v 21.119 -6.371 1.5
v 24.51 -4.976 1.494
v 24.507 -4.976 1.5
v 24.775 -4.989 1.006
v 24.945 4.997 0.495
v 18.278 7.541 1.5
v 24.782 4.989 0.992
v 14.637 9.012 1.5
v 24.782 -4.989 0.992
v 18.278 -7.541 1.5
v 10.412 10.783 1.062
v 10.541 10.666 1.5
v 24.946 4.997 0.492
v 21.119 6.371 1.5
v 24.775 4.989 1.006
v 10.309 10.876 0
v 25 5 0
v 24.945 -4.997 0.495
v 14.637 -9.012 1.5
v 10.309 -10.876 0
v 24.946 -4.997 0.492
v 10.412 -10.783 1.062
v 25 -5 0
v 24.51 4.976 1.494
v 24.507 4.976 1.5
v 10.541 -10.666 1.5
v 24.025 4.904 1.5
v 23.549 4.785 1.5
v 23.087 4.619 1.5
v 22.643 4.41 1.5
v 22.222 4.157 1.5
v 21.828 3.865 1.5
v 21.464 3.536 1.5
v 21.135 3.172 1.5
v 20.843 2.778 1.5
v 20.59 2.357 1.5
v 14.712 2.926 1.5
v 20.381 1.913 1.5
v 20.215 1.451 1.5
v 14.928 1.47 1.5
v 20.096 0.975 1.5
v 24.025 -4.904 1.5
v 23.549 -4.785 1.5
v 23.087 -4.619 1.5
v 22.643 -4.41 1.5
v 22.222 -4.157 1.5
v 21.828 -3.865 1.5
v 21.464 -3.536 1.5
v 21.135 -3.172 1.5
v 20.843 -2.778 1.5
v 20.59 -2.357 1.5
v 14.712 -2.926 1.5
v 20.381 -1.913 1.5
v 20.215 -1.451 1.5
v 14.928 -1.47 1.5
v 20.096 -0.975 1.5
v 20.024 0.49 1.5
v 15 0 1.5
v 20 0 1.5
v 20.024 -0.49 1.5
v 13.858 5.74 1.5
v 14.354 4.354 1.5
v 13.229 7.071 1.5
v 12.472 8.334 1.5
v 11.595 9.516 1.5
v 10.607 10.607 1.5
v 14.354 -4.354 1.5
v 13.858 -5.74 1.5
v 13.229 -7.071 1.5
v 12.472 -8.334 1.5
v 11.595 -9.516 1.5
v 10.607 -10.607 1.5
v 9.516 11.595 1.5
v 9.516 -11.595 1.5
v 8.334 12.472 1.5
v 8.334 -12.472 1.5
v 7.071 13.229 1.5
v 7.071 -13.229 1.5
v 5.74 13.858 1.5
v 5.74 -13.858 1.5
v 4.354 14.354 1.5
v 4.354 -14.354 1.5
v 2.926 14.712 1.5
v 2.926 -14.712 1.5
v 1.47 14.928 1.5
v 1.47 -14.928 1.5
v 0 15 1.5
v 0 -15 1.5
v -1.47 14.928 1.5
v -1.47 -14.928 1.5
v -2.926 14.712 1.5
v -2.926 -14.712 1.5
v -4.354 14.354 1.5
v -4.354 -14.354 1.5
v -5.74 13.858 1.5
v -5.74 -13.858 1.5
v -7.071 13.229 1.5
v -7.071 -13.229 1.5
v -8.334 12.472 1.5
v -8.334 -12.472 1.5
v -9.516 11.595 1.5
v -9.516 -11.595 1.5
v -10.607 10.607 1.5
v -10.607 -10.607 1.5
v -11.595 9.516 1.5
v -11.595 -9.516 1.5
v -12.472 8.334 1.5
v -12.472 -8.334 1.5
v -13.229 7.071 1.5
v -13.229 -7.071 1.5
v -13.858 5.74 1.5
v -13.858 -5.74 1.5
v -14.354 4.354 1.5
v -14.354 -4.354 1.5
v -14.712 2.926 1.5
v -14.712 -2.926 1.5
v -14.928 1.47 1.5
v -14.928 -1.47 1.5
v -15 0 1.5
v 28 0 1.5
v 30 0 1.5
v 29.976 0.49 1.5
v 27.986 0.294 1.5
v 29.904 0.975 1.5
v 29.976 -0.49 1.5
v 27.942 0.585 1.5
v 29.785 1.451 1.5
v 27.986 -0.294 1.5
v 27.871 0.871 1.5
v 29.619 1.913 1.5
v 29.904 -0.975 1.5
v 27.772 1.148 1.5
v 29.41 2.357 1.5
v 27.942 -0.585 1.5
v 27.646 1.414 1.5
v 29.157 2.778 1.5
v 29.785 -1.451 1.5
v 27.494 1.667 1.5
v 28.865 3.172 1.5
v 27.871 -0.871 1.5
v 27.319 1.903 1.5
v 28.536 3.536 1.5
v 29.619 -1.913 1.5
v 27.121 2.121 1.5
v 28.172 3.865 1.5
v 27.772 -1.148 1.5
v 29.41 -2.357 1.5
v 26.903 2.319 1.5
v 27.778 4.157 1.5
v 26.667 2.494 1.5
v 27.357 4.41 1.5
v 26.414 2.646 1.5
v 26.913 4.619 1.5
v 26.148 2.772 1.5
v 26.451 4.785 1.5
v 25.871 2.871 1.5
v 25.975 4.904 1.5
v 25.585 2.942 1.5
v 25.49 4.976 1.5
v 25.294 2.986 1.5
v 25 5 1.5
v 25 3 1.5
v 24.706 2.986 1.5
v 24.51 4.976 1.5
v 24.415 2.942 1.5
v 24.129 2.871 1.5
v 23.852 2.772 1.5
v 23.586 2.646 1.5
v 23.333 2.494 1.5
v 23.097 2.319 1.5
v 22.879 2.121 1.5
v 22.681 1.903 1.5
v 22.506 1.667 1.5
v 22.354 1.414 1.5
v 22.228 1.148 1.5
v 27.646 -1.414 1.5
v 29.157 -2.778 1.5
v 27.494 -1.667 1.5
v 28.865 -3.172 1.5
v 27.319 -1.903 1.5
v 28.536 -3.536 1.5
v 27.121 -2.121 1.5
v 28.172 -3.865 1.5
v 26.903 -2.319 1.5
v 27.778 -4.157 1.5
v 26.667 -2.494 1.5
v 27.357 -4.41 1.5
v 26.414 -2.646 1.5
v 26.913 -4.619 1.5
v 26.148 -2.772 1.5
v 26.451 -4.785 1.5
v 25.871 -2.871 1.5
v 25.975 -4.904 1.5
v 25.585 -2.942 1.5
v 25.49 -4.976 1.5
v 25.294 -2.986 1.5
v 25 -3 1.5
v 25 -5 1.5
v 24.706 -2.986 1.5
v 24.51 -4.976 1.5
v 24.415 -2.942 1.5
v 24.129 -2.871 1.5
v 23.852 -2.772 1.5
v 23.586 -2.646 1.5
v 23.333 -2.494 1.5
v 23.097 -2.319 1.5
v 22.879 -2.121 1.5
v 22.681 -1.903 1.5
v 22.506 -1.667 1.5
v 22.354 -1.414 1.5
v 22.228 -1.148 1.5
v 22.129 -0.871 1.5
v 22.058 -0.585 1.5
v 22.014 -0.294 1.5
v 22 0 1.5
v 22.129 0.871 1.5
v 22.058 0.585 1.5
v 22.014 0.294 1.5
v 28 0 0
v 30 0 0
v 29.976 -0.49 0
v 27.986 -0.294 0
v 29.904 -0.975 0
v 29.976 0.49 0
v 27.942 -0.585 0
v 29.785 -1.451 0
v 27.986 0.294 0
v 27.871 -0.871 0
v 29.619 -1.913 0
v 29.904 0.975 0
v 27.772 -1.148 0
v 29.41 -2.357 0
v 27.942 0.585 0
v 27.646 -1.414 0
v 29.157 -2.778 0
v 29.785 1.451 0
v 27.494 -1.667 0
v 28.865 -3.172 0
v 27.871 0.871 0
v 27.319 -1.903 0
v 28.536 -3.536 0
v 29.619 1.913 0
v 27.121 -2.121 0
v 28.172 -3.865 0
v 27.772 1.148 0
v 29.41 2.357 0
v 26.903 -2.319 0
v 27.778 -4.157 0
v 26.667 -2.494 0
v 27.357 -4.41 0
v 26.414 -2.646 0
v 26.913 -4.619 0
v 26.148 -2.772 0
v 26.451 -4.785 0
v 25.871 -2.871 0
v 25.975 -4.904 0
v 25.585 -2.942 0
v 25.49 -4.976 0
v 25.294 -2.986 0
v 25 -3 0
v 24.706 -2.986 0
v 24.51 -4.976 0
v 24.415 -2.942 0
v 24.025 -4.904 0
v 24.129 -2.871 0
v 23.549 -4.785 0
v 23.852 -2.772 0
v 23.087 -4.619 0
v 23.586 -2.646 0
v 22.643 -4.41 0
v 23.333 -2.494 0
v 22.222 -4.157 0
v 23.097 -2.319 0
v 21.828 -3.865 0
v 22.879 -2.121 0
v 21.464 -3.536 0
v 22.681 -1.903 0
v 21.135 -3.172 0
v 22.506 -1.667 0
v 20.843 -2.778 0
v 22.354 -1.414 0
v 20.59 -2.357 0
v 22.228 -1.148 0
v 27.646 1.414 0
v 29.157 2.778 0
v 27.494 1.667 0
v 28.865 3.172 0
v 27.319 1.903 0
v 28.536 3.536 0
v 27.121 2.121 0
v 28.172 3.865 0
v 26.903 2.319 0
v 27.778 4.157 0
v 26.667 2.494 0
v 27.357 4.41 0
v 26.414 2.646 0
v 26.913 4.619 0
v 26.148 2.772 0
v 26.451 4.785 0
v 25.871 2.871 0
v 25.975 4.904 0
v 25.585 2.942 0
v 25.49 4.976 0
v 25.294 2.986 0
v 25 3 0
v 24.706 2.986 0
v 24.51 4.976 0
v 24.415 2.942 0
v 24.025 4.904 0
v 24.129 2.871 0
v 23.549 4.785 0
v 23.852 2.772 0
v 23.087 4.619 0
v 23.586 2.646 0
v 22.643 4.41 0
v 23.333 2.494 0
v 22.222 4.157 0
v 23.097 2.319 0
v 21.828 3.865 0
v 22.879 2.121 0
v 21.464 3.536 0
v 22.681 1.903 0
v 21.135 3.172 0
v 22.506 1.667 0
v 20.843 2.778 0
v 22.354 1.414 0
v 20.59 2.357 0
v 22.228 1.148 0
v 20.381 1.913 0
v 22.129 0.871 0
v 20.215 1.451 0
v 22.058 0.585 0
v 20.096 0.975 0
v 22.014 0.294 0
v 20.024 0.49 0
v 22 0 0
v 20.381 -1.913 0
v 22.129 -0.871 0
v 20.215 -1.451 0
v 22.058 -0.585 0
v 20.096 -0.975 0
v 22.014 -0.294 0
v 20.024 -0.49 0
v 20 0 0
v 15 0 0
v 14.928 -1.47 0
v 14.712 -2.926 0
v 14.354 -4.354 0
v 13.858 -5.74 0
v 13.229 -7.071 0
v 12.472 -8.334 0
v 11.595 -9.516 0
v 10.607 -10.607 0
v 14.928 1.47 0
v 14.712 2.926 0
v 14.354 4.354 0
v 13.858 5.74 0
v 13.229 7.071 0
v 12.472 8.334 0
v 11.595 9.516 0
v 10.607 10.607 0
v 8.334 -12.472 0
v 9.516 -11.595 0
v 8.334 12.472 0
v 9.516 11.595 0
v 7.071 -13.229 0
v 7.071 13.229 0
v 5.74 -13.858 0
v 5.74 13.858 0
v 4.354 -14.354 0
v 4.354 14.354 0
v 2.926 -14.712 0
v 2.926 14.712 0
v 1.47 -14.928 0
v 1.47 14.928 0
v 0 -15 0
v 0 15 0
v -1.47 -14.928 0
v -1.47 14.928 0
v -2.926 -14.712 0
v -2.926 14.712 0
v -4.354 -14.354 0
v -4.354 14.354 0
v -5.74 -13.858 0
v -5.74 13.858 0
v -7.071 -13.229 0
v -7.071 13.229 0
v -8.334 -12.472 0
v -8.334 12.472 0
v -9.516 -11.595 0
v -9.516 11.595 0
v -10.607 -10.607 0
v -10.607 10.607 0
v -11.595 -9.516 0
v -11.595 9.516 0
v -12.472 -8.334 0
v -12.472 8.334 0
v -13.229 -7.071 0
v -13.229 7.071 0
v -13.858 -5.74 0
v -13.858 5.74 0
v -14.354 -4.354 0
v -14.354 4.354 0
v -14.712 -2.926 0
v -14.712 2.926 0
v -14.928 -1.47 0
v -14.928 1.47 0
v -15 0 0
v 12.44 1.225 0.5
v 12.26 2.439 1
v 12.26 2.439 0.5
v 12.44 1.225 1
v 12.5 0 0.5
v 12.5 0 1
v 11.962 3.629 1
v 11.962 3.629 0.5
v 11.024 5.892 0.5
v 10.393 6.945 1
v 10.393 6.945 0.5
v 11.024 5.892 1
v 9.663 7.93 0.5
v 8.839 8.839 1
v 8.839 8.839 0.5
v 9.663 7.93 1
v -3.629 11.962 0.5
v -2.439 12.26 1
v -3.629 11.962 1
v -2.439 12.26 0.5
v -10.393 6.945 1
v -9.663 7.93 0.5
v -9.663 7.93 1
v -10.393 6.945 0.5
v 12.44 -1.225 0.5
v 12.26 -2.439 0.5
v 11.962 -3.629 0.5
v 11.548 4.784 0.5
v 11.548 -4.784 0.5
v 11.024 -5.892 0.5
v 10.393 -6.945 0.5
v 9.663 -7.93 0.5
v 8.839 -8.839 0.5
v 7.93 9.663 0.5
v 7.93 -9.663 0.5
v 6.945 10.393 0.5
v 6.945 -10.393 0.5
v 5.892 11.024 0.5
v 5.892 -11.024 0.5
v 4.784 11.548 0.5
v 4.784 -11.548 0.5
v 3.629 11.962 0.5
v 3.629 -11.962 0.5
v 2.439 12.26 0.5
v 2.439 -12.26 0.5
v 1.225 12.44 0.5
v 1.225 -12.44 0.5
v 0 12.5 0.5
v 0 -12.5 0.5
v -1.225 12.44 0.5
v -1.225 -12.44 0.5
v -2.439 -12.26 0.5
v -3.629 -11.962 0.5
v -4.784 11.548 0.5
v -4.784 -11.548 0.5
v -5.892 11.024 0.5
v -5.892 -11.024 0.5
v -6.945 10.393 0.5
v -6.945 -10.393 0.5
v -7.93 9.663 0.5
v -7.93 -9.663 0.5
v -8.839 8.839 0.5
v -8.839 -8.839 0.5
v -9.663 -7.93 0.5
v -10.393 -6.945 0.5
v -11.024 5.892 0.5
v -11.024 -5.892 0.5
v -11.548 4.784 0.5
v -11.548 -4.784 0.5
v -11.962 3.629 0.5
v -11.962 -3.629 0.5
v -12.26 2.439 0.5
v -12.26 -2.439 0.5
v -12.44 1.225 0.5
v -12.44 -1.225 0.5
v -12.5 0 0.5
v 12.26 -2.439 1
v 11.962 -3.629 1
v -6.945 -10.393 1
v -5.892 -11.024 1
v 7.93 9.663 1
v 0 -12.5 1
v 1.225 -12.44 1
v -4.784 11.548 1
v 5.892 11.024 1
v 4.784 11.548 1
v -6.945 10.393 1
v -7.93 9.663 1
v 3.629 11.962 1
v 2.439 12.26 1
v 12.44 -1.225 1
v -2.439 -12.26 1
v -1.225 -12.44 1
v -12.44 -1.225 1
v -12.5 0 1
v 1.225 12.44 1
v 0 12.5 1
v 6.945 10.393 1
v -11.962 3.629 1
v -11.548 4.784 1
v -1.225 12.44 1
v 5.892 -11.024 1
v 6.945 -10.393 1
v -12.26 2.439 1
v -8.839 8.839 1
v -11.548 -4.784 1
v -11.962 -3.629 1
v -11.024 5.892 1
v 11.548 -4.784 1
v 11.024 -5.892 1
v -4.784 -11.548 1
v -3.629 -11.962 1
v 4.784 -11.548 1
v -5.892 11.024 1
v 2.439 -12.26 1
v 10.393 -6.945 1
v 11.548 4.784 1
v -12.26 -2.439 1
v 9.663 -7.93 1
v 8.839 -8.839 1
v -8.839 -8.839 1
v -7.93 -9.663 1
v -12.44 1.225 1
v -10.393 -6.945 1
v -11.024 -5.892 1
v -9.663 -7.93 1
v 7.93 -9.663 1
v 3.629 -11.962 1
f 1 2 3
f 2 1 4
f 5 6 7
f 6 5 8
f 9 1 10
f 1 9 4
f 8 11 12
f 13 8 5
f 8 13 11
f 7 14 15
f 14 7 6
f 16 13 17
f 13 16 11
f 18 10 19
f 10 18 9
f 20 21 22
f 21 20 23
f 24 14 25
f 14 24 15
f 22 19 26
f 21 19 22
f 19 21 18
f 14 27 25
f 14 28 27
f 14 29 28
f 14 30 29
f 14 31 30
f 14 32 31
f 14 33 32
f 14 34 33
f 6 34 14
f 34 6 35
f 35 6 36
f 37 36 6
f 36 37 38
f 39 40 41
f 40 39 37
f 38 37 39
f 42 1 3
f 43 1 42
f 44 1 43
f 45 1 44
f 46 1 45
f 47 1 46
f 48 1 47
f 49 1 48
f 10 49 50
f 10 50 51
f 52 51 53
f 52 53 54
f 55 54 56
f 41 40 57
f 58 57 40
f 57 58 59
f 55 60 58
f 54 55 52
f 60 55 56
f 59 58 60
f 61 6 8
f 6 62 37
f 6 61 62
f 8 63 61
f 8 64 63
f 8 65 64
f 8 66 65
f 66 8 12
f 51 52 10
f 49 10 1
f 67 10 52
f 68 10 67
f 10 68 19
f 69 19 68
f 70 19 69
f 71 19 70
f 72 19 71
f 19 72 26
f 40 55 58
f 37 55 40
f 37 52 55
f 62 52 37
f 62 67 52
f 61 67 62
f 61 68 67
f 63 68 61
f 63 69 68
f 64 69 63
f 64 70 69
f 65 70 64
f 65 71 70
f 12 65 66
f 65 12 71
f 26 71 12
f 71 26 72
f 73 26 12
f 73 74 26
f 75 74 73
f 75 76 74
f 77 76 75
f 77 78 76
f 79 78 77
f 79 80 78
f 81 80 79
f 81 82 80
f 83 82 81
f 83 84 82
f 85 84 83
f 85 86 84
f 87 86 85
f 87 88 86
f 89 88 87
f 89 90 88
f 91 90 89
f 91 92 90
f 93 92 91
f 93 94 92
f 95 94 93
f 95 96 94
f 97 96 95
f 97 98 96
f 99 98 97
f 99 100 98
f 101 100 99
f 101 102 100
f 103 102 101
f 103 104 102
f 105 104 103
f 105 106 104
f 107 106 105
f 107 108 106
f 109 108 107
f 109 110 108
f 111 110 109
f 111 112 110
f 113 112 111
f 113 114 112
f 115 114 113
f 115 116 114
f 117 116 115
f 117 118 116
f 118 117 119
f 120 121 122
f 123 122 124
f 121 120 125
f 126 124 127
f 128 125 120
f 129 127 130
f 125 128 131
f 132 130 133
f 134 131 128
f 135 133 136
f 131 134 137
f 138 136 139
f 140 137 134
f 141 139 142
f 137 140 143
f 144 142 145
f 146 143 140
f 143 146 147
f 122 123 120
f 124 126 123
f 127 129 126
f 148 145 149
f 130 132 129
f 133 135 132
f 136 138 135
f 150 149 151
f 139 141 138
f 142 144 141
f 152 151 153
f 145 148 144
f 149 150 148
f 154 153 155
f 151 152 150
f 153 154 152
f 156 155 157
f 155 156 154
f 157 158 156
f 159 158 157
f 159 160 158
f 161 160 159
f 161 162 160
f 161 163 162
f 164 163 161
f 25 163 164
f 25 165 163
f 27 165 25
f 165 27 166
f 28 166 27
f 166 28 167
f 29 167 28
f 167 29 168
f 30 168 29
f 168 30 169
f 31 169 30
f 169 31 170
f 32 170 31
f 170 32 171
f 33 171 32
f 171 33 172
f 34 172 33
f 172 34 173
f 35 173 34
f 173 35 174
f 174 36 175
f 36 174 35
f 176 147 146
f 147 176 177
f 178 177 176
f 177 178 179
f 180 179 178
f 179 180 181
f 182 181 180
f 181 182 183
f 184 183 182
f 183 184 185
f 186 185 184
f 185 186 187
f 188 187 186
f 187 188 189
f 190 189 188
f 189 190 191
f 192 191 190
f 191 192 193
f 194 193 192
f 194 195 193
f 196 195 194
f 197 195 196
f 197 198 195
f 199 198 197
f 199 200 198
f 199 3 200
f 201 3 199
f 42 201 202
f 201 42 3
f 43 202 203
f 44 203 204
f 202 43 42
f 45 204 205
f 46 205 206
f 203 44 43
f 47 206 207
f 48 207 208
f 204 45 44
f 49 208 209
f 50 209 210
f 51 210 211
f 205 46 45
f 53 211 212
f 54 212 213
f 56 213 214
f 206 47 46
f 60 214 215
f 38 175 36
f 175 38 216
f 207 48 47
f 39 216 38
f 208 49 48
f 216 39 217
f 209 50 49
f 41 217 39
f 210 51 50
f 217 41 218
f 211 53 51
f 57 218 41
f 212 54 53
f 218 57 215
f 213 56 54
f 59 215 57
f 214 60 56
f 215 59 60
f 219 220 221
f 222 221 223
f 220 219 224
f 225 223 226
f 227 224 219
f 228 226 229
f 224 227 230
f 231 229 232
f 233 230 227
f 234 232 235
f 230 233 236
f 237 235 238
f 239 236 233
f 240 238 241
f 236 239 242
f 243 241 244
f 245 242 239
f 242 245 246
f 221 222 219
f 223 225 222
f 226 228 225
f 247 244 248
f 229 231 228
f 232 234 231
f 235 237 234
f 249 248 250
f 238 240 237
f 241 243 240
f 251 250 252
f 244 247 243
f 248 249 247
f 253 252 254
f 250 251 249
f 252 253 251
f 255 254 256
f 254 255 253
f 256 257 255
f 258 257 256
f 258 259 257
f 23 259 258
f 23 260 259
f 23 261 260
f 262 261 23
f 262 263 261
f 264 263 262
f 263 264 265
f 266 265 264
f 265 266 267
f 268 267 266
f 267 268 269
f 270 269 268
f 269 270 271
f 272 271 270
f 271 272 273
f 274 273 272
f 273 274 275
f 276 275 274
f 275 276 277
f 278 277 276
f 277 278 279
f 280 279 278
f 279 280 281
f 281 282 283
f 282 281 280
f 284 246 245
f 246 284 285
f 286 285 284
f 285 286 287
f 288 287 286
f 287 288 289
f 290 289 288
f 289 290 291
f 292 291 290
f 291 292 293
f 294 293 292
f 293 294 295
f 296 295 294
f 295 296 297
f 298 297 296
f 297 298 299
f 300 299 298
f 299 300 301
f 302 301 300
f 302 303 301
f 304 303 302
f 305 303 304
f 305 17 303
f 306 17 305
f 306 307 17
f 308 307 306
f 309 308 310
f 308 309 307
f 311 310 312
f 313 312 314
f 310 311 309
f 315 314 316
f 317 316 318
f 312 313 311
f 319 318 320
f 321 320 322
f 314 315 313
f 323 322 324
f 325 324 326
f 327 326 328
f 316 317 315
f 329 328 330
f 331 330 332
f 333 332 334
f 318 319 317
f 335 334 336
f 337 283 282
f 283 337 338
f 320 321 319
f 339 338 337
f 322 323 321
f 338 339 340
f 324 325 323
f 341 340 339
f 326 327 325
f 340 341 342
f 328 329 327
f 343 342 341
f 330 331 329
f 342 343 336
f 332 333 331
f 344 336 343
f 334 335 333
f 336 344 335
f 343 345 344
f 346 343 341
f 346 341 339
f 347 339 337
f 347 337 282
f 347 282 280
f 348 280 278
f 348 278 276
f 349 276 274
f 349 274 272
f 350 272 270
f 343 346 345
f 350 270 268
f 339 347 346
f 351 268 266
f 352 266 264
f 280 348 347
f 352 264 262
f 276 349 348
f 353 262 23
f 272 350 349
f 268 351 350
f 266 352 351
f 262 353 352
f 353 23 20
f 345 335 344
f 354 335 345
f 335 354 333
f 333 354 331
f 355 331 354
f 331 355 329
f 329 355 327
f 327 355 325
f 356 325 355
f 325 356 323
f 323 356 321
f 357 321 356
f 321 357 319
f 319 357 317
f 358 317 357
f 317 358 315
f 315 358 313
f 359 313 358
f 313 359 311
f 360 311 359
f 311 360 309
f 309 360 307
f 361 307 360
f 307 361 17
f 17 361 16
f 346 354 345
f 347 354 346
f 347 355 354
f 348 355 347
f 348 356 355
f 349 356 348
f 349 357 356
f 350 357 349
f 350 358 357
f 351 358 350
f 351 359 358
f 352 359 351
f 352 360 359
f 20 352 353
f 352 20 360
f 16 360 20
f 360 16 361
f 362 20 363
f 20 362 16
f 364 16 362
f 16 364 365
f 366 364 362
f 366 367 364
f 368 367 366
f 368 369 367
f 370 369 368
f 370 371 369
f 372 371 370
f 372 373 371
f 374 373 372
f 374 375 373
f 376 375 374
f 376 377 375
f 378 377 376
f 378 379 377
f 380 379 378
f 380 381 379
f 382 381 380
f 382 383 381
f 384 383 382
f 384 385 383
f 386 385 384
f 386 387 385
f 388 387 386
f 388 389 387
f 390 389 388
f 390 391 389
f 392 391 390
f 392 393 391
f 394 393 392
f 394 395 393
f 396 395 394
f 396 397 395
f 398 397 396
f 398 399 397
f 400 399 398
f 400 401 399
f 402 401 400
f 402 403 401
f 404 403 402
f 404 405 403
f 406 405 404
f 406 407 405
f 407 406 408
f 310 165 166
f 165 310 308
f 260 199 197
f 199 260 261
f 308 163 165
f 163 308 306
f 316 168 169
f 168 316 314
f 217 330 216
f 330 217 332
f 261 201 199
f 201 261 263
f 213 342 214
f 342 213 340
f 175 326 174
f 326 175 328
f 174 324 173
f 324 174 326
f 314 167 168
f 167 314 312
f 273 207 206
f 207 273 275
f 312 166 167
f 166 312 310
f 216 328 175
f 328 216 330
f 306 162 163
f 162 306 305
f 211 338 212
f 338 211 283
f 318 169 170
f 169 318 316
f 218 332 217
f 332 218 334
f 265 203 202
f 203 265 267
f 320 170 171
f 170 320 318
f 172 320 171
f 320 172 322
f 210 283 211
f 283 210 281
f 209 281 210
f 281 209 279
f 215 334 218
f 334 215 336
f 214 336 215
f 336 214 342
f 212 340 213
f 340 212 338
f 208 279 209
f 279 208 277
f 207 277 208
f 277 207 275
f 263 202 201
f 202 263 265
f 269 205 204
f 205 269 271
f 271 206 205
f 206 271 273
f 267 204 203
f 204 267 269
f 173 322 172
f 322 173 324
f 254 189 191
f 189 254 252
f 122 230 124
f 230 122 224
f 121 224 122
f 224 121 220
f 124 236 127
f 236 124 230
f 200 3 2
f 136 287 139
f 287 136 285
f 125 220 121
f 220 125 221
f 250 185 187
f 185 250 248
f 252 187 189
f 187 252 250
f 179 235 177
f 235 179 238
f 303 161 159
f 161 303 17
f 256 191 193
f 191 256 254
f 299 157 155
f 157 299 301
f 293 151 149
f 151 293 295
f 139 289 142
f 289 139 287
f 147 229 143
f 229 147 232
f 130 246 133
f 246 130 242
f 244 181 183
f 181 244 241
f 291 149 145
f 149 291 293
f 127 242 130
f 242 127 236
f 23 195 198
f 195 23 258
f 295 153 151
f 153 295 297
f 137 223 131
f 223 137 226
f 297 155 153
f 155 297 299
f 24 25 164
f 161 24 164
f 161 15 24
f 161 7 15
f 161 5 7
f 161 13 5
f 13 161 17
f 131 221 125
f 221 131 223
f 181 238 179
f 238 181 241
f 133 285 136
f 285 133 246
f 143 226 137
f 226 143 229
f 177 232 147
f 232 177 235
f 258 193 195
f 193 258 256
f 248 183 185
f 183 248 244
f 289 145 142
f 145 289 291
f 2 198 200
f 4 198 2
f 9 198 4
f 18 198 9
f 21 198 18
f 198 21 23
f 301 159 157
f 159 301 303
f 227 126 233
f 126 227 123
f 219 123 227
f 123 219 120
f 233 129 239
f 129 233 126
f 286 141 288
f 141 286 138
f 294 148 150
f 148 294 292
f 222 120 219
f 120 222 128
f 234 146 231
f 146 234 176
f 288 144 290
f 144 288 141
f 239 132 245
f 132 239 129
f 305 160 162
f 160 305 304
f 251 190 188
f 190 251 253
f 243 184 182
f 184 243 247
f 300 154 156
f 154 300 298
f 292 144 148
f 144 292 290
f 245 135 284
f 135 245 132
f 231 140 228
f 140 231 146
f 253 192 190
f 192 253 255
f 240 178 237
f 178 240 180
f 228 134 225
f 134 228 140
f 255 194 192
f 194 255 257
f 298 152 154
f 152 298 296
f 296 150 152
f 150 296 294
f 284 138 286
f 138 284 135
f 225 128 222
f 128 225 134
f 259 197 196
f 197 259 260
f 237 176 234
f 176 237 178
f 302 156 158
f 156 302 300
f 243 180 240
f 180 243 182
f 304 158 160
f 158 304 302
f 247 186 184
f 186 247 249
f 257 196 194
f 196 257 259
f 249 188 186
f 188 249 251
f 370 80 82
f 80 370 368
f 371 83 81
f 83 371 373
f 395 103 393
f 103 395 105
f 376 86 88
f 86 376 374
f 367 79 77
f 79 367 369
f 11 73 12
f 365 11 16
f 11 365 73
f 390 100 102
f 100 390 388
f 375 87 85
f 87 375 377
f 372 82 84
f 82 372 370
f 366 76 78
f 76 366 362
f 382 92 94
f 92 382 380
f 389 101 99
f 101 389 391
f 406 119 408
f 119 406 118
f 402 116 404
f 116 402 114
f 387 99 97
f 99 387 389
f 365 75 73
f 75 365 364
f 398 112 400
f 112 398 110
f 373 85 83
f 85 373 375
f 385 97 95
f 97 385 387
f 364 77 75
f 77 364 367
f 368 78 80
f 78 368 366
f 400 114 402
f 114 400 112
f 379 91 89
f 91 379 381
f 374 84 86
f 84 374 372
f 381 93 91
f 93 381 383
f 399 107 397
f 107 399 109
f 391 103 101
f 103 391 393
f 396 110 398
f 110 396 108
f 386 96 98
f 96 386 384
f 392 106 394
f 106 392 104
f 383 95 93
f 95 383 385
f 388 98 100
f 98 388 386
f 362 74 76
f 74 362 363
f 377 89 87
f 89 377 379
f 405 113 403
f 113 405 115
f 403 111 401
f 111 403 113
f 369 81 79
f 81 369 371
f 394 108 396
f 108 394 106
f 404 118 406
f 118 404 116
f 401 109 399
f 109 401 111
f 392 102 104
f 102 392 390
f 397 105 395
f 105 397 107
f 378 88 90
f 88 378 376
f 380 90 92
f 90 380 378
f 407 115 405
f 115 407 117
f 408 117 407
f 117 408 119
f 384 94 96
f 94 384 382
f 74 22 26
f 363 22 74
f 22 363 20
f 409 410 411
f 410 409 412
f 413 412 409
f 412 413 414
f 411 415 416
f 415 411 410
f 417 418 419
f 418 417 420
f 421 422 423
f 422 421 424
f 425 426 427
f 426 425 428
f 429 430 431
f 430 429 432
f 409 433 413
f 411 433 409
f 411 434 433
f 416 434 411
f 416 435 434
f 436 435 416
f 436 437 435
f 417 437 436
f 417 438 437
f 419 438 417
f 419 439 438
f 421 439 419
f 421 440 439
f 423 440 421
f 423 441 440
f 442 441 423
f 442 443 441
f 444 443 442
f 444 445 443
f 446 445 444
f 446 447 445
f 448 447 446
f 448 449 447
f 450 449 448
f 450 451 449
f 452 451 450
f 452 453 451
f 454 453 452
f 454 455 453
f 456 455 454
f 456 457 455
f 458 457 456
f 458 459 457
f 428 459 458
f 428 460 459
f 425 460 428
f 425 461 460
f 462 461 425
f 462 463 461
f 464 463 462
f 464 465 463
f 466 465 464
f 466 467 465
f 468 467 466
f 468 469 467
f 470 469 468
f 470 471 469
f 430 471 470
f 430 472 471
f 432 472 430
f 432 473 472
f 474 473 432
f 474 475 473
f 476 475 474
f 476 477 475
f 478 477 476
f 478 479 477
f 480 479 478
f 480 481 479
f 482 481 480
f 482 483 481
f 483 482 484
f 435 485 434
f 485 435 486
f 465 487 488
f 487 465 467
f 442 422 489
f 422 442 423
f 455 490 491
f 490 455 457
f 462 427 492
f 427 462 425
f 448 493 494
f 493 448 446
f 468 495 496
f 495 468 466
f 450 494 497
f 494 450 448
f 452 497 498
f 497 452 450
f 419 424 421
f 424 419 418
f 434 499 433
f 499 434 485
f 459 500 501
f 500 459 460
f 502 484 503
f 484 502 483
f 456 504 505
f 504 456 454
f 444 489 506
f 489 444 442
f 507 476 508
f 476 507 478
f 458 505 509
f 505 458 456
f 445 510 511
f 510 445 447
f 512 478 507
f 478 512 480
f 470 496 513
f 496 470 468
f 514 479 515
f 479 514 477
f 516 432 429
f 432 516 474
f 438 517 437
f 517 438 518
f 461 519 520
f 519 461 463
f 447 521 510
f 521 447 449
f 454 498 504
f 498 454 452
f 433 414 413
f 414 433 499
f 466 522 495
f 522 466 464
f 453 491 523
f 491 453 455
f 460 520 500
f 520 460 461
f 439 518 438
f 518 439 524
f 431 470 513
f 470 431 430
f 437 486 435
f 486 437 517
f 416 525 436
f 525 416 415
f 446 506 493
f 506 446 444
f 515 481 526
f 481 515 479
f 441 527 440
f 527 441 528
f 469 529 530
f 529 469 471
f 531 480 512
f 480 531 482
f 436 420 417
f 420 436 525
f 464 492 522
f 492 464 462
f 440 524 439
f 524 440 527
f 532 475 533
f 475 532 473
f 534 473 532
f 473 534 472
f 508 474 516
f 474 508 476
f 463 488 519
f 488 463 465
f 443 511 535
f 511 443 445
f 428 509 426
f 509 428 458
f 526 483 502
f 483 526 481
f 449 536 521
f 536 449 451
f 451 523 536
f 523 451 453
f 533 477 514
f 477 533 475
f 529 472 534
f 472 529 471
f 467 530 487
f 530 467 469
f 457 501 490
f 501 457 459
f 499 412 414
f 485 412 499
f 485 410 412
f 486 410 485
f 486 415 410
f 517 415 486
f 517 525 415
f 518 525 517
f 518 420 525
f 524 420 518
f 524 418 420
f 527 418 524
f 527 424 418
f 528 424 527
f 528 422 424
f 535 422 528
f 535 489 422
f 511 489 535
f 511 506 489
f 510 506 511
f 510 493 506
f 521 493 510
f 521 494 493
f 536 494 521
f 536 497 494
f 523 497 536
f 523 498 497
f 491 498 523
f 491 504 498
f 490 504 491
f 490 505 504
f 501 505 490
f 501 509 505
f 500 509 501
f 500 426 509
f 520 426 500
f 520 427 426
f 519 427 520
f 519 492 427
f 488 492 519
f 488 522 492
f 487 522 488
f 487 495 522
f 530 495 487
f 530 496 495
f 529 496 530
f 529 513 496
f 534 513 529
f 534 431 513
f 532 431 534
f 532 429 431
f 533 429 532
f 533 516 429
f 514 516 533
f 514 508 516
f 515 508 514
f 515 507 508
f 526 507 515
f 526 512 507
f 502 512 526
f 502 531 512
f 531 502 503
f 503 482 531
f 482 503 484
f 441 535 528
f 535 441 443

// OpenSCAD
$fn=64;

length=25; // plus 10 cause of cubes
height=1.5;
d_body=30;
d_head=10;
d_keychain=6;
d_chip=25;
h_chip=0.5;

difference() {
  union() {
    cylinder(d=d_body,h=height);

    translate([length/2,0,0]) difference() {
      rotate([0,90,0]) cylinder(h=length, d1=d_body, d2=d_head, center=true);
      translate([-length/2,-d_body/2,height]) cube([length,d_body,length]);
      translate([-length/2,-d_body/2,-length]) cube([length,d_body,length]);
      translate([length/2,0,0]) cylinder(h=height,d=d_keychain);
    }

    difference() {
      translate([length,0,0]) cylinder(h=height,d=d_head);
      translate([length,0,0]) cylinder(h=height,d=d_keychain);
    }
  }

  translate([0,0,(height-h_chip)/2]) cylinder(d=d_chip,h=h_chip);
}
